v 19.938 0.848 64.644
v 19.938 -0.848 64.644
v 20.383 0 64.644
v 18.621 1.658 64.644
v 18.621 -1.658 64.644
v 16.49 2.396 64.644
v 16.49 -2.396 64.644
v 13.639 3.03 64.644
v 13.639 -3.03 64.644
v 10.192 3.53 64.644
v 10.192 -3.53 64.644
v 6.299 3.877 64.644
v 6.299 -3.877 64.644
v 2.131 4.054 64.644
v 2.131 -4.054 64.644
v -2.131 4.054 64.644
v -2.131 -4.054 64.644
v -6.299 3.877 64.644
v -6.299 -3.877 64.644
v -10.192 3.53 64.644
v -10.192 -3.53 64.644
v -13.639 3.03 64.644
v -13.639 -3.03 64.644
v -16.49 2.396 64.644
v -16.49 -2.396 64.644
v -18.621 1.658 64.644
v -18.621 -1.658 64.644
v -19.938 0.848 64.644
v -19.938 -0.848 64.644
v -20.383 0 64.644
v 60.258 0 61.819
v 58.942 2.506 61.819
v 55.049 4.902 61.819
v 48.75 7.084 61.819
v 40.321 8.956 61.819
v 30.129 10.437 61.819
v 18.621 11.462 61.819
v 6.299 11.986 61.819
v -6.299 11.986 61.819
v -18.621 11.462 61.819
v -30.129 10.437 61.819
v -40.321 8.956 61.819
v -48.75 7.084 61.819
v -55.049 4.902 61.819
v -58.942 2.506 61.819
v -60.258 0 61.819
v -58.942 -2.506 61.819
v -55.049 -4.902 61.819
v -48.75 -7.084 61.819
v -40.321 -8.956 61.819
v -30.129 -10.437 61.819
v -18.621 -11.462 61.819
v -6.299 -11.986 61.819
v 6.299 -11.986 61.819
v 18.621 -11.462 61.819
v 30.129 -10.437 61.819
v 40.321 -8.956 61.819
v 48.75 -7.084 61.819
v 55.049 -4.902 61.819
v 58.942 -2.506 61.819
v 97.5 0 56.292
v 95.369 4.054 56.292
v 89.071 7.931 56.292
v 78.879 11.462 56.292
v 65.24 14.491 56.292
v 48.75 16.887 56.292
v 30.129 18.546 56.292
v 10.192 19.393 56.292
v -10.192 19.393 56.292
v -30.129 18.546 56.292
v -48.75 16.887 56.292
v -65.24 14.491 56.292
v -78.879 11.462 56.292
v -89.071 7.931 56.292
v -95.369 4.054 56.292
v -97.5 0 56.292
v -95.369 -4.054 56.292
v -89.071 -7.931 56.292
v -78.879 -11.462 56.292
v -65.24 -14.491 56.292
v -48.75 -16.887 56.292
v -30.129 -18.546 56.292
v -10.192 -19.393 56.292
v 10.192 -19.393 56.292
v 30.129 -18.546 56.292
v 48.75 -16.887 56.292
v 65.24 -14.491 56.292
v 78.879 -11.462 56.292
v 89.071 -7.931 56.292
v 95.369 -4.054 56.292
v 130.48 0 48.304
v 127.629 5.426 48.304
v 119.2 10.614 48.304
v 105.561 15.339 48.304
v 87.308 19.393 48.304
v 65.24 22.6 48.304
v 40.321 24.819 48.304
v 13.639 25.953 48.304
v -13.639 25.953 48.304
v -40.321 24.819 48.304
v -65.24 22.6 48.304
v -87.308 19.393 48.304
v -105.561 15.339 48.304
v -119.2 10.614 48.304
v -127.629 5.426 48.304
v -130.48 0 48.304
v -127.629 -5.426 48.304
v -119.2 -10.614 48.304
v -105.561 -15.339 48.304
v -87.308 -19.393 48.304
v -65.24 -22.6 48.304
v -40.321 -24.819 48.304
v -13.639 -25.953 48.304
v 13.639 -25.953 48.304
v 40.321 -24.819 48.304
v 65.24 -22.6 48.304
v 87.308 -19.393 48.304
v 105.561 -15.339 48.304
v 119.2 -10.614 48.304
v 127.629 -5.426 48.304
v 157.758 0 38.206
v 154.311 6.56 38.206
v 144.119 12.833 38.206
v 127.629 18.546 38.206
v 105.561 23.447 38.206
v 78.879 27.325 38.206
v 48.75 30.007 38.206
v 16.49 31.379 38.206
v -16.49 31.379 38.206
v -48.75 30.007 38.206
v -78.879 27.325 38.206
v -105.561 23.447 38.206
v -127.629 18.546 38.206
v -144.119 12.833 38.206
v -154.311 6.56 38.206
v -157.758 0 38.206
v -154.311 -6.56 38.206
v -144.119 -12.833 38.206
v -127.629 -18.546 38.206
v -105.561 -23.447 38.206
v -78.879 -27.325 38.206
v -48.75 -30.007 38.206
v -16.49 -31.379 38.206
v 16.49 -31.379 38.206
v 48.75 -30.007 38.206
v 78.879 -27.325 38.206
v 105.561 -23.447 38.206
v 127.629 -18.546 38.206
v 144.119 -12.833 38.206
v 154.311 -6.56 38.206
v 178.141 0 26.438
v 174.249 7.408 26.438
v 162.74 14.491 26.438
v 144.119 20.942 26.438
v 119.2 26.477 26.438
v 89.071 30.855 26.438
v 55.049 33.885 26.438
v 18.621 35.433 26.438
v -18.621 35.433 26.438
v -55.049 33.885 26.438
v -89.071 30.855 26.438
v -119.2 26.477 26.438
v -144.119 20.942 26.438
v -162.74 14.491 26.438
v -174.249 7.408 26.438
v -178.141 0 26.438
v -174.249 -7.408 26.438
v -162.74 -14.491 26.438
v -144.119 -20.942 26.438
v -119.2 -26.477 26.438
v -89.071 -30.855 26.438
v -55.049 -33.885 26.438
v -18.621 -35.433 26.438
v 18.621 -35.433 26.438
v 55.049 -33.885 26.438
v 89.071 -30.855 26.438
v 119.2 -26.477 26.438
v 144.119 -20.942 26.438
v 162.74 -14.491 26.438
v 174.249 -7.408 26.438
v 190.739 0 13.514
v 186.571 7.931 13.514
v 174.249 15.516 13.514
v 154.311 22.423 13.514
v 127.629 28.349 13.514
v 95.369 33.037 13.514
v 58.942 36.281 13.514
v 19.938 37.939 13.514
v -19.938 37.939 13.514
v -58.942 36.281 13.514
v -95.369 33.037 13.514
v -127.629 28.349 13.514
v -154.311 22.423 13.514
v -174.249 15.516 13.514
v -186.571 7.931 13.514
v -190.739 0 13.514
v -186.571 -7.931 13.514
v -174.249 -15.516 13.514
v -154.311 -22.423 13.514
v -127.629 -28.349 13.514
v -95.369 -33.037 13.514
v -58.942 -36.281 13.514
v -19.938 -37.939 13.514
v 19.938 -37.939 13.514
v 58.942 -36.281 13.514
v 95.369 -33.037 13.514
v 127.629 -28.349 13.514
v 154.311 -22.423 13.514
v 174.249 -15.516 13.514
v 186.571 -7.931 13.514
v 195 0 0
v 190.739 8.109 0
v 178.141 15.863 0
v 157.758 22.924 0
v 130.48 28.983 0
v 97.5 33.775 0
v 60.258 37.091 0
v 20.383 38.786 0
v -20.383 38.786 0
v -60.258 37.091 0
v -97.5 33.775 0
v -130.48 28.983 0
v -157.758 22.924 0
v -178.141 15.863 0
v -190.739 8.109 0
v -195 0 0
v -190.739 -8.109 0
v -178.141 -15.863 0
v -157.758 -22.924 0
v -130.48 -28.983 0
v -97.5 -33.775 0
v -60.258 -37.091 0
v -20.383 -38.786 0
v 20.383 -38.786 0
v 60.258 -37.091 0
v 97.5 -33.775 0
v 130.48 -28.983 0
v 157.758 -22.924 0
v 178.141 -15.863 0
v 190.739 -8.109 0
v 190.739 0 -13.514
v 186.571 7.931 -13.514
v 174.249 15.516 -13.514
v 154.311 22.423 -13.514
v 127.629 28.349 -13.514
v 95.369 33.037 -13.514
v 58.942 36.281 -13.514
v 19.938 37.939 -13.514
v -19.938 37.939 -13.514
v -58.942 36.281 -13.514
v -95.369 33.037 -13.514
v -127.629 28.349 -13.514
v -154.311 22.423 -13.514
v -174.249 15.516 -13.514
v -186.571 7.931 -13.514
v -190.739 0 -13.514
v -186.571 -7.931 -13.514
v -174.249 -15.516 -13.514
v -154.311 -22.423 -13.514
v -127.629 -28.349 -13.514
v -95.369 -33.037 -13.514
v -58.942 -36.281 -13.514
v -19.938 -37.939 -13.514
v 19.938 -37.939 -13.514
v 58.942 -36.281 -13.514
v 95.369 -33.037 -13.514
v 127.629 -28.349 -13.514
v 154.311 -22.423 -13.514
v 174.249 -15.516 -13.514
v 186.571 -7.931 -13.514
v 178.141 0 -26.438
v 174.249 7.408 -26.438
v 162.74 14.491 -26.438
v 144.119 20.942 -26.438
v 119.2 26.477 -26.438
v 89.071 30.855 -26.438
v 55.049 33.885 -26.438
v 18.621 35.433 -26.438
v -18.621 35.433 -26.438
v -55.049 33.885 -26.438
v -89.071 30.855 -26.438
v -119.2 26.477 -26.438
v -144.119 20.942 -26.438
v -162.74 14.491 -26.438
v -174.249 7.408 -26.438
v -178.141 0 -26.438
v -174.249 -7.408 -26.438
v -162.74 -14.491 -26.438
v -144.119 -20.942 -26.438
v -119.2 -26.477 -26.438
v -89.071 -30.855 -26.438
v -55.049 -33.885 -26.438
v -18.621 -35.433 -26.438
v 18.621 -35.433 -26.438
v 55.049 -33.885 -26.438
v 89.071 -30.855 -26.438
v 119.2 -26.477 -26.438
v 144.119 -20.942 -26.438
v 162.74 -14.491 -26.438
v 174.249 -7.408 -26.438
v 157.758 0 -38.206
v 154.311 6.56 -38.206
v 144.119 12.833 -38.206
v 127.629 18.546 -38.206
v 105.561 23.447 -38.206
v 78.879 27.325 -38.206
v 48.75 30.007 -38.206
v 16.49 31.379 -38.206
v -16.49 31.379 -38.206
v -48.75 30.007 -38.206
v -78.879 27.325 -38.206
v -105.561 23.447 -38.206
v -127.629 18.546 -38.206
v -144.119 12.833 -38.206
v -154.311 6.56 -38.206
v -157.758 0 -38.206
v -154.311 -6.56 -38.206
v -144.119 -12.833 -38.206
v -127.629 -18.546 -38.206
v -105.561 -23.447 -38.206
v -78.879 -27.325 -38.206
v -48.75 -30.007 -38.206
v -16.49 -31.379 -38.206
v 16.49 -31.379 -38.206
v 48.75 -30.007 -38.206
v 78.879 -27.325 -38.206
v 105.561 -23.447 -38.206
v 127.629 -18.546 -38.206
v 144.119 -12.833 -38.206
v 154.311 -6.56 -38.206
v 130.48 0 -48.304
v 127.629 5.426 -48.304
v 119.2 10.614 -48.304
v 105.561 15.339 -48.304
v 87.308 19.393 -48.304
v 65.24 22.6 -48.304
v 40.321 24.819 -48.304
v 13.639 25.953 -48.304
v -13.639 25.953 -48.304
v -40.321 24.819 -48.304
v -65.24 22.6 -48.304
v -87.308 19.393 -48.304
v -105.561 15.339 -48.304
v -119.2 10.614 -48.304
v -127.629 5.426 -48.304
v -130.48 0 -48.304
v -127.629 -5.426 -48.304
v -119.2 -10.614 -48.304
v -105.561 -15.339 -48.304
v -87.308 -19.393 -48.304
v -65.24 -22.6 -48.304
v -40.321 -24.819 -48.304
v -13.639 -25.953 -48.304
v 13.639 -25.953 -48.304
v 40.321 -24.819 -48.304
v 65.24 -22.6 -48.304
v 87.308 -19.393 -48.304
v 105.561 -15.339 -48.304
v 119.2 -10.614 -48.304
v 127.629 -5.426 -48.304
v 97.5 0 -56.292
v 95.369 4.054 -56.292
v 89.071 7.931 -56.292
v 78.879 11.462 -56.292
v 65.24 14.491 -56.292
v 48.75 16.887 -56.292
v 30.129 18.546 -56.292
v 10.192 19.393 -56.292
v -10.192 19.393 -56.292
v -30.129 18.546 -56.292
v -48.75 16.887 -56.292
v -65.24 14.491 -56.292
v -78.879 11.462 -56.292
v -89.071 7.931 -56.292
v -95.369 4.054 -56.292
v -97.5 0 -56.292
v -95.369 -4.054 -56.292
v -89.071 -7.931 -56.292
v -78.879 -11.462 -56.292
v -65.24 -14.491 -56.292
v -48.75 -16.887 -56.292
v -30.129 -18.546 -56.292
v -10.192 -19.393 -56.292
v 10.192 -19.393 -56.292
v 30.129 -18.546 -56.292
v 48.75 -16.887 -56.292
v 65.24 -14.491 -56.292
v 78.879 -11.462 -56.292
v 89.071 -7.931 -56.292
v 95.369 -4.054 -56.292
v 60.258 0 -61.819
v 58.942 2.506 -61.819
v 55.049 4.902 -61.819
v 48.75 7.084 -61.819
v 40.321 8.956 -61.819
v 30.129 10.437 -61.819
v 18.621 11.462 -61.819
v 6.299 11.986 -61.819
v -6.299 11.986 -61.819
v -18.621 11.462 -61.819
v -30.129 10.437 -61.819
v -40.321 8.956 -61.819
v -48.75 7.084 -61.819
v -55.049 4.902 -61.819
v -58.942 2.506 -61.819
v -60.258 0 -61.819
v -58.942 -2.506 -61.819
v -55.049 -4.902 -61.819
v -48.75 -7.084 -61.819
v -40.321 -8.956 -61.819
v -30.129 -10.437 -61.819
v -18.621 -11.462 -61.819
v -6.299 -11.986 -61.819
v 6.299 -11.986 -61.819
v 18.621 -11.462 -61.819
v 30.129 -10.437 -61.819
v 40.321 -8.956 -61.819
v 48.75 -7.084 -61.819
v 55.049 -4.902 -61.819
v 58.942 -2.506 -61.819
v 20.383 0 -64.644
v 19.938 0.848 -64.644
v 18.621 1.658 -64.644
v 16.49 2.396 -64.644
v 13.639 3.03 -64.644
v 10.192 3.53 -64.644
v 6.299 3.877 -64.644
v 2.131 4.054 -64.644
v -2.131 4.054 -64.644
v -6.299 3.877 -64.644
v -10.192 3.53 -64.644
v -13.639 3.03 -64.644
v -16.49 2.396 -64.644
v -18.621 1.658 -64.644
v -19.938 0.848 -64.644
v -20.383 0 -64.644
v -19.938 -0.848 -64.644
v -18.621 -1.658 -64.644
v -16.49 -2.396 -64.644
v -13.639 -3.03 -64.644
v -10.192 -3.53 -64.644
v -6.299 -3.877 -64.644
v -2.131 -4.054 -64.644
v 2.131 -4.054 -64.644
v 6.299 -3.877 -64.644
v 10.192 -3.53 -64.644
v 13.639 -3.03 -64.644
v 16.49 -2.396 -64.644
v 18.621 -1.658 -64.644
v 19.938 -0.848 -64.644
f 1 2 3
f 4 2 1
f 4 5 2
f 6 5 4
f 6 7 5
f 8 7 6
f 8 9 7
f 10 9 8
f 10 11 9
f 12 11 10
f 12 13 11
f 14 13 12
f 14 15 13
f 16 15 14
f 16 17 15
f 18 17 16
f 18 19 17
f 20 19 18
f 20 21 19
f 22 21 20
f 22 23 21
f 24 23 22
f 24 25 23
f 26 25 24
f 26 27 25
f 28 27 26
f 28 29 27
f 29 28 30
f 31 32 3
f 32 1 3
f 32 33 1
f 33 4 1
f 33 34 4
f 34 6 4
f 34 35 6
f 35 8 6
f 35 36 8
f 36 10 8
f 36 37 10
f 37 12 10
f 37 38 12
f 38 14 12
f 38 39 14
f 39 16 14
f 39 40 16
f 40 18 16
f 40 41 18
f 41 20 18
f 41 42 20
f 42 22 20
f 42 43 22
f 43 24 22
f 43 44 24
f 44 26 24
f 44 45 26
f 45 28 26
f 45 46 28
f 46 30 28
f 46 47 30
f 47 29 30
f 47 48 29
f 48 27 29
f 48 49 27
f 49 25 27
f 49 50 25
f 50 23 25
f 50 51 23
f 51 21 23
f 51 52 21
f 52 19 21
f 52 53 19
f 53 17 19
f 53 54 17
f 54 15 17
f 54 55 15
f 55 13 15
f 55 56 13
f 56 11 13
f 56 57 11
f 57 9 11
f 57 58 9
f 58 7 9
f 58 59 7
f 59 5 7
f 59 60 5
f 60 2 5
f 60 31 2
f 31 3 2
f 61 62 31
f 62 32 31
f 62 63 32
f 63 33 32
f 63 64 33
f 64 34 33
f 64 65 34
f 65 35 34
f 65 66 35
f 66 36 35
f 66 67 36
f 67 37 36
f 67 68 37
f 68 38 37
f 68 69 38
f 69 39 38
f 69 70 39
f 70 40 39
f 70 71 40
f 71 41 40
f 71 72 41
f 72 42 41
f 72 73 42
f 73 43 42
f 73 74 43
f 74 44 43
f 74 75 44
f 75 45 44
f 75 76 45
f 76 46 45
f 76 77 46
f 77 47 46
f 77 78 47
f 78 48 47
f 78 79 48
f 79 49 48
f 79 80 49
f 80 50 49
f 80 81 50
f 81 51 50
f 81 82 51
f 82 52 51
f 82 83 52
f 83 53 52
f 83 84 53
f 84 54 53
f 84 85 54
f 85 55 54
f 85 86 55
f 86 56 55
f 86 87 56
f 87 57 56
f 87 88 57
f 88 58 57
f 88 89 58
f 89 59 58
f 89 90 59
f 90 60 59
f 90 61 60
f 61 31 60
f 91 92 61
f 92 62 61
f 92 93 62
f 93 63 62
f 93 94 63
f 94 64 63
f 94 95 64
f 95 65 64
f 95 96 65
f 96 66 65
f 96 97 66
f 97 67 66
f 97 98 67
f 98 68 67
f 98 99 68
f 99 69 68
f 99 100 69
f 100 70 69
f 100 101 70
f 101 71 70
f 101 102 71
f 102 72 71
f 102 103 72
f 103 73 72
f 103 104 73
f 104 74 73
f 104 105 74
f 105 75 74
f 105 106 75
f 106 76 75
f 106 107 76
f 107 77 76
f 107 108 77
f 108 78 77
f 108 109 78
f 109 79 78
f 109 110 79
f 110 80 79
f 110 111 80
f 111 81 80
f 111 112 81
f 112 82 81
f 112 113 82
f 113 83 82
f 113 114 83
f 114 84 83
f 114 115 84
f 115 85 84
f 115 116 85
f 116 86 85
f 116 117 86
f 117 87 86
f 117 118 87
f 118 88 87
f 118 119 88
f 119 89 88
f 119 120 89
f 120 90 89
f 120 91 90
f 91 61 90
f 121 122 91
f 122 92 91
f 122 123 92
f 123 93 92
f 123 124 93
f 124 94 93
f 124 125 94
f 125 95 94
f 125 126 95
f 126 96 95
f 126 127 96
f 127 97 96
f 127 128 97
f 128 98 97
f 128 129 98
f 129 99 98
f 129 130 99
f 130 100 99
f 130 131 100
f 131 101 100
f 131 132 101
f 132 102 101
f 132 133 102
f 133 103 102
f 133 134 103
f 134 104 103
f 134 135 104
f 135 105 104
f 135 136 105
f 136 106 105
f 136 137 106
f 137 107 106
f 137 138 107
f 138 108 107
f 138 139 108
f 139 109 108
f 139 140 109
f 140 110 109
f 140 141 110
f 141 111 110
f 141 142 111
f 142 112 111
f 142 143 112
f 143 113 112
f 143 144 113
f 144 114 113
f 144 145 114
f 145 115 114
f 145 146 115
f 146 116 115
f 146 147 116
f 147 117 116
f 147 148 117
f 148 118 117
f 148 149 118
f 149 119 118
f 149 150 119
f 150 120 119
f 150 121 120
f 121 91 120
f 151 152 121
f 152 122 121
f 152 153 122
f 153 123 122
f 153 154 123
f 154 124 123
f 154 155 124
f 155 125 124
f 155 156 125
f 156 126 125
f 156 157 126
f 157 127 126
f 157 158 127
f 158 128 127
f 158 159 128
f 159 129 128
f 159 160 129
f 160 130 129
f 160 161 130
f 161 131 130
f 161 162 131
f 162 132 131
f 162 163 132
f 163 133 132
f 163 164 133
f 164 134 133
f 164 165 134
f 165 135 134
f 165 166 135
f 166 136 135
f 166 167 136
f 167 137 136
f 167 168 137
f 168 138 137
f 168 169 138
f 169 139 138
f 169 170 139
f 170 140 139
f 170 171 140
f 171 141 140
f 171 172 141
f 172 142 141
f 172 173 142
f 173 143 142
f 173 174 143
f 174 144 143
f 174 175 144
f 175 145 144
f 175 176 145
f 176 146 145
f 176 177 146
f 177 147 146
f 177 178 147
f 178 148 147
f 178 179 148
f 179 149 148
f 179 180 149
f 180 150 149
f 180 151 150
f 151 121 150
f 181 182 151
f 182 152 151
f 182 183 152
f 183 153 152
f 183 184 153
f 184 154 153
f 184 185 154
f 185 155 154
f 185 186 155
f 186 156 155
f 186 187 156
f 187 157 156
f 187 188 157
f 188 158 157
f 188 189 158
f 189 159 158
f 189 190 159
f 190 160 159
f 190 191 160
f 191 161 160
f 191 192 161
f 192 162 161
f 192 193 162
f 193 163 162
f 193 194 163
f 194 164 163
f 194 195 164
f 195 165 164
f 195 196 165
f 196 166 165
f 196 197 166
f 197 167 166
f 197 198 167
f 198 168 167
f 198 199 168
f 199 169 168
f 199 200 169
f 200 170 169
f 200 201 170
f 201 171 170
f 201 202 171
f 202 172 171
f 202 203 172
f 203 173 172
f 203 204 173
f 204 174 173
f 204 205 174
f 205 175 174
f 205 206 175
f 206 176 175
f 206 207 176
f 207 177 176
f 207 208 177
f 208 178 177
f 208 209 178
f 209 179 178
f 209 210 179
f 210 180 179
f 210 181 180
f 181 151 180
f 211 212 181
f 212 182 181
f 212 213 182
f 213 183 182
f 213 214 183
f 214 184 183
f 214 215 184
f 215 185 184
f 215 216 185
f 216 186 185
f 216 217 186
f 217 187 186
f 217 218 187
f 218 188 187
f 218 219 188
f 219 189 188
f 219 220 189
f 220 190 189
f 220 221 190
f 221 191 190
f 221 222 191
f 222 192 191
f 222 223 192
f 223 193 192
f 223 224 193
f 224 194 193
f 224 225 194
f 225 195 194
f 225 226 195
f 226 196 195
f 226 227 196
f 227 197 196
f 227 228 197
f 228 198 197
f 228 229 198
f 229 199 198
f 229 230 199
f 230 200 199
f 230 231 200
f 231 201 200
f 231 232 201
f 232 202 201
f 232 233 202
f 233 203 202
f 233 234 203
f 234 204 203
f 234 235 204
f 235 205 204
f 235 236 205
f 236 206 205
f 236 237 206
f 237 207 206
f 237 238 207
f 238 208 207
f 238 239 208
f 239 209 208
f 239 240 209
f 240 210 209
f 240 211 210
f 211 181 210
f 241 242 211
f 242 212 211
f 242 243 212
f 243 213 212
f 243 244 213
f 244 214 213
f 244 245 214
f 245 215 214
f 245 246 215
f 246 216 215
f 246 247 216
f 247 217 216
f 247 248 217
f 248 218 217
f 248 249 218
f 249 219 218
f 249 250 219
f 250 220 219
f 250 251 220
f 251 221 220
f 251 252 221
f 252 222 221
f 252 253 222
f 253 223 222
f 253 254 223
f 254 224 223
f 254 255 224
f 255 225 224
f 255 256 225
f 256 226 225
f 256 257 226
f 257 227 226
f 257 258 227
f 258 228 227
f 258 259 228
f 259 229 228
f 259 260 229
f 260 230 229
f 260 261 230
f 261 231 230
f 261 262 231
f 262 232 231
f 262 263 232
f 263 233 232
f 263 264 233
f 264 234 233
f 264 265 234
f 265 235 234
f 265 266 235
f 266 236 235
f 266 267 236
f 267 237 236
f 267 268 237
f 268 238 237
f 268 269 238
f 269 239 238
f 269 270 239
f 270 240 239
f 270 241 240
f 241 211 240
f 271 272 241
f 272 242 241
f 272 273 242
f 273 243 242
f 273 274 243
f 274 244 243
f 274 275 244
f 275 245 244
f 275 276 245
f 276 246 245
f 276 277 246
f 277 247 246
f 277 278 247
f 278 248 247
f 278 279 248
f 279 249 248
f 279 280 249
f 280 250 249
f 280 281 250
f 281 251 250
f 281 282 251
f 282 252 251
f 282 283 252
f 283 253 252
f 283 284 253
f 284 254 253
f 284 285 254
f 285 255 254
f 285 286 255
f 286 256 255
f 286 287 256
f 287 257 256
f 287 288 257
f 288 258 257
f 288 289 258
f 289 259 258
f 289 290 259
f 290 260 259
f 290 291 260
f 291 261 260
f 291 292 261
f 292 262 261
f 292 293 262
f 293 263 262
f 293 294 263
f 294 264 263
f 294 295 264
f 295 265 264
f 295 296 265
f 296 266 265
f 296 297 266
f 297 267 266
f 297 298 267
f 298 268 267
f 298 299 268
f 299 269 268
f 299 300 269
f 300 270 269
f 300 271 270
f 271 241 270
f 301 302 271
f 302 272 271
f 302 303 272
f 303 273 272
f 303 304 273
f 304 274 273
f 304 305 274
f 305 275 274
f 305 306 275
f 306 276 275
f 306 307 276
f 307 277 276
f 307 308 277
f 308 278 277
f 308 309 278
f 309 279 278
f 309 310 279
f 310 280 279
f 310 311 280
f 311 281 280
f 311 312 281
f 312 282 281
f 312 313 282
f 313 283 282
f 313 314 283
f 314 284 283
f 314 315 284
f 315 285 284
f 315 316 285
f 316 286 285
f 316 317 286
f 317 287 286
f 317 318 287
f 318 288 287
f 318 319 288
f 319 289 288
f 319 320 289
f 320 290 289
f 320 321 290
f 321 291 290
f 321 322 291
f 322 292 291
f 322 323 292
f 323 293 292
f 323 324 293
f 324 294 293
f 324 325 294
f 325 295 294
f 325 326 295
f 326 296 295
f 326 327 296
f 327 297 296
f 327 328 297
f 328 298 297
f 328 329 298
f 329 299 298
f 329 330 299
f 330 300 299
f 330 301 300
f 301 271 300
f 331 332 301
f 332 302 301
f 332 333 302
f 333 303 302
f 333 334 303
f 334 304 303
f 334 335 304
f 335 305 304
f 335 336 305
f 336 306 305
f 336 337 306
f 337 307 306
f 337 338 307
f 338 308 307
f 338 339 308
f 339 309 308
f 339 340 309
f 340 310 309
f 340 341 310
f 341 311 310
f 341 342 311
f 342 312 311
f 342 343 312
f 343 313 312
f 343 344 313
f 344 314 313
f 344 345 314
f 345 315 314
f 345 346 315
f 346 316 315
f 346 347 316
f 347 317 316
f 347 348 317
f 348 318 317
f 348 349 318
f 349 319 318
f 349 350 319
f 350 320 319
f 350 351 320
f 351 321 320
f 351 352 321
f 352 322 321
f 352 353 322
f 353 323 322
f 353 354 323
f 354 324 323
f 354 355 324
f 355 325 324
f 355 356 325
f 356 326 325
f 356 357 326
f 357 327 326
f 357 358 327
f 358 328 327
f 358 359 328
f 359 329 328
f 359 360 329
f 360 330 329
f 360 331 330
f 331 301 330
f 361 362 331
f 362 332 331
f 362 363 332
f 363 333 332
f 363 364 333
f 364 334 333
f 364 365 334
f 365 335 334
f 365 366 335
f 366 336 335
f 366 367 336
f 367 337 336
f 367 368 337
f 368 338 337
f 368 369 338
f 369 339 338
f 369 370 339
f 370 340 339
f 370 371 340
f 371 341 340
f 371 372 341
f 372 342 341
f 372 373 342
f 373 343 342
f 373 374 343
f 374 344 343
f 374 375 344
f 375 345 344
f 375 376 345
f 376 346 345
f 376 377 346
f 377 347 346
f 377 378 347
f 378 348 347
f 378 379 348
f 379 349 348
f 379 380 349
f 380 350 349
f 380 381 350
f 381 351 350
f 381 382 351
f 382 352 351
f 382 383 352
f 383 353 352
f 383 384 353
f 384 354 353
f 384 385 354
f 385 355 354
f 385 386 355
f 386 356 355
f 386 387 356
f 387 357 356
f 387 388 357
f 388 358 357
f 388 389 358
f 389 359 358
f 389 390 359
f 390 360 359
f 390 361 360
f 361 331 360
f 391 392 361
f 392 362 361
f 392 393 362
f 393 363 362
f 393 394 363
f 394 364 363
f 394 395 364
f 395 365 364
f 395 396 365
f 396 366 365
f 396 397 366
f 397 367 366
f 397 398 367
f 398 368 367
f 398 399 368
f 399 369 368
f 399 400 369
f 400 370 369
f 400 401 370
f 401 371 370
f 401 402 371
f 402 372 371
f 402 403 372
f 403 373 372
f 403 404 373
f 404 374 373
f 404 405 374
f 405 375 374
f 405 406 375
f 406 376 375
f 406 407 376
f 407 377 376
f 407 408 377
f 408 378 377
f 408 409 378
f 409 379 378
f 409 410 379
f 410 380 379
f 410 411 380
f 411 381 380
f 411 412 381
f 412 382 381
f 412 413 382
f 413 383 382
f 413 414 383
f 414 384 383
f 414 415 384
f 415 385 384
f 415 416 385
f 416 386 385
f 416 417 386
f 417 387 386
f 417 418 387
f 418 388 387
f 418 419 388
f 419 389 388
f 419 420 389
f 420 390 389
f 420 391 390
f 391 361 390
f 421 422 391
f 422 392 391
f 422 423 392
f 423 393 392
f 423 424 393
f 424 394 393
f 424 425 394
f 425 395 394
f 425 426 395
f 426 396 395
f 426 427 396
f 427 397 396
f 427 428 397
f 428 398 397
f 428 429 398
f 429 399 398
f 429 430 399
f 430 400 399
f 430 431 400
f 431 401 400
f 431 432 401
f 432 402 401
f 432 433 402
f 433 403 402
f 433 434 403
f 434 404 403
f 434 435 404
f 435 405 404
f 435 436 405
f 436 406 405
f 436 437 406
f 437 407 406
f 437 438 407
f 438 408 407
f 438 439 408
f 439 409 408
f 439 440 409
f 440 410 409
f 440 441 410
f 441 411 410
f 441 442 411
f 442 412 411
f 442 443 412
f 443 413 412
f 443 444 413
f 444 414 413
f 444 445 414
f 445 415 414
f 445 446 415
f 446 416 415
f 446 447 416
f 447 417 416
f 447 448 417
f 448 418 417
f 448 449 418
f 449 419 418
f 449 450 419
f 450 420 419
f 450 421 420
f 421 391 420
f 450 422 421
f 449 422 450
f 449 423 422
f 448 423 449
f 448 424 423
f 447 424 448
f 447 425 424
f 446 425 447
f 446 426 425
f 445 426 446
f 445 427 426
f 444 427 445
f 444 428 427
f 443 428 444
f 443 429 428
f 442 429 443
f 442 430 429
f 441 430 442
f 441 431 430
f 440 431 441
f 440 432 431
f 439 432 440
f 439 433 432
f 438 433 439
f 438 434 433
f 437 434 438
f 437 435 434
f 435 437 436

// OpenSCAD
// Generated by SolidPython 1.0.1 on 2020-07-29 00:46:51


scale(v = [15, 3, 5]) {
	sphere(r = 13);
}
/***********************************************
*********      SolidPython code:      **********
************************************************
 
# import packages: SolidPython
from solid import *
from solid.utils import *
from itertools import chain, combinations, permutations


class Resize:

    def __init__(self, scad_file):
        self.scad_file = scad_file
        #self.scad_file = import_scad(scad_file)
        # cone/cylinder param:
        self.r1 = 0
        self.r2 = 0
        self.h = 0
        # rectangular prism param:
        self.w = 0
        self.l = 0
        # ellipse param:
        self.r = 0

    # import OpenScad code (file name corresponds to shape)


    # classify shape + parameters
    def assign(self, param1, param2, param3):
        if self.scad_file == 'cone.scad':
            self.r1 = param1
            self.r2 = param2
            self.h = param3
        elif self.scad_file == 'cylinder.scad':
            self.r1 = param1
            self.r2 = param2
            self.h = param3
        elif self.scad_file == 'rectangularPrism.scad':
            self.h = param1
            self.l = param2
            self.w = param3
        else:
            self.r = param1
            self.h = param2

    # resize parameters
    def iterate(self):
        x = range(3, 20, 2)
        i = 1
        if self.scad_file == 'cone.scad':
            tempList = list(permutations(x, 2))
            for temp in tempList:
                param1 = temp[0]
                param2 = temp[1]
                filepath = 'produced_scad_files/' + 'cone' + str(param1) + '_' + str(param2) + '_' + '.scad'
                scad_render_to_file(cylinder(h=param1, r1=param2, r2=0), filepath)

        elif self.scad_file == 'cylinder.scad':
            tempList = list(permutations(x, 3))
            for temp in tempList:
                param1 = temp[0]
                param2 = temp[1]
                filepath = 'produced_scad_files/' + 'cylinder' + str(param1) + '_' + str(param2) + '_' + '.scad'
                scad_render_to_file(cylinder(h=param1, r1=param2, r2=param2), filepath)

        elif self.scad_file == 'rectangularPrism.scad':
            tempList = list(permutations(x, 3))
            for temp in tempList:
                param1 = temp[0]
                param2 = temp[1]
                param3 = temp[2]
                filepath = 'produced_scad_files/' + 'rectangularPrism' + str(param1) + '_' + str(param2) + '_' + str(
                    param3) + '.scad'
                scad_render_to_file(cube(size=(param1, param2, param3)), filepath)

        elif self.scad_file == 'ellipse.scad':
            tempList = list(permutations(x, 4))
            for temp in tempList:
                param1 = temp[0]
                param2 = temp[1]
                param3 = temp[2]
                param4 = temp[3]
                filepath = 'produced_scad_files/' + 'ellipse' + str(param1) + '_' + str(param2) + '_' + str(param3) + '_' + str(param4) + '.scad'
                scad_render_to_file(scale([param1, param2, param3])(sphere(r=param4)), filepath)

    def render_to_scadfile(self):
        scad_render_to_file(scad, 'example.scad') 
 
************************************************/
